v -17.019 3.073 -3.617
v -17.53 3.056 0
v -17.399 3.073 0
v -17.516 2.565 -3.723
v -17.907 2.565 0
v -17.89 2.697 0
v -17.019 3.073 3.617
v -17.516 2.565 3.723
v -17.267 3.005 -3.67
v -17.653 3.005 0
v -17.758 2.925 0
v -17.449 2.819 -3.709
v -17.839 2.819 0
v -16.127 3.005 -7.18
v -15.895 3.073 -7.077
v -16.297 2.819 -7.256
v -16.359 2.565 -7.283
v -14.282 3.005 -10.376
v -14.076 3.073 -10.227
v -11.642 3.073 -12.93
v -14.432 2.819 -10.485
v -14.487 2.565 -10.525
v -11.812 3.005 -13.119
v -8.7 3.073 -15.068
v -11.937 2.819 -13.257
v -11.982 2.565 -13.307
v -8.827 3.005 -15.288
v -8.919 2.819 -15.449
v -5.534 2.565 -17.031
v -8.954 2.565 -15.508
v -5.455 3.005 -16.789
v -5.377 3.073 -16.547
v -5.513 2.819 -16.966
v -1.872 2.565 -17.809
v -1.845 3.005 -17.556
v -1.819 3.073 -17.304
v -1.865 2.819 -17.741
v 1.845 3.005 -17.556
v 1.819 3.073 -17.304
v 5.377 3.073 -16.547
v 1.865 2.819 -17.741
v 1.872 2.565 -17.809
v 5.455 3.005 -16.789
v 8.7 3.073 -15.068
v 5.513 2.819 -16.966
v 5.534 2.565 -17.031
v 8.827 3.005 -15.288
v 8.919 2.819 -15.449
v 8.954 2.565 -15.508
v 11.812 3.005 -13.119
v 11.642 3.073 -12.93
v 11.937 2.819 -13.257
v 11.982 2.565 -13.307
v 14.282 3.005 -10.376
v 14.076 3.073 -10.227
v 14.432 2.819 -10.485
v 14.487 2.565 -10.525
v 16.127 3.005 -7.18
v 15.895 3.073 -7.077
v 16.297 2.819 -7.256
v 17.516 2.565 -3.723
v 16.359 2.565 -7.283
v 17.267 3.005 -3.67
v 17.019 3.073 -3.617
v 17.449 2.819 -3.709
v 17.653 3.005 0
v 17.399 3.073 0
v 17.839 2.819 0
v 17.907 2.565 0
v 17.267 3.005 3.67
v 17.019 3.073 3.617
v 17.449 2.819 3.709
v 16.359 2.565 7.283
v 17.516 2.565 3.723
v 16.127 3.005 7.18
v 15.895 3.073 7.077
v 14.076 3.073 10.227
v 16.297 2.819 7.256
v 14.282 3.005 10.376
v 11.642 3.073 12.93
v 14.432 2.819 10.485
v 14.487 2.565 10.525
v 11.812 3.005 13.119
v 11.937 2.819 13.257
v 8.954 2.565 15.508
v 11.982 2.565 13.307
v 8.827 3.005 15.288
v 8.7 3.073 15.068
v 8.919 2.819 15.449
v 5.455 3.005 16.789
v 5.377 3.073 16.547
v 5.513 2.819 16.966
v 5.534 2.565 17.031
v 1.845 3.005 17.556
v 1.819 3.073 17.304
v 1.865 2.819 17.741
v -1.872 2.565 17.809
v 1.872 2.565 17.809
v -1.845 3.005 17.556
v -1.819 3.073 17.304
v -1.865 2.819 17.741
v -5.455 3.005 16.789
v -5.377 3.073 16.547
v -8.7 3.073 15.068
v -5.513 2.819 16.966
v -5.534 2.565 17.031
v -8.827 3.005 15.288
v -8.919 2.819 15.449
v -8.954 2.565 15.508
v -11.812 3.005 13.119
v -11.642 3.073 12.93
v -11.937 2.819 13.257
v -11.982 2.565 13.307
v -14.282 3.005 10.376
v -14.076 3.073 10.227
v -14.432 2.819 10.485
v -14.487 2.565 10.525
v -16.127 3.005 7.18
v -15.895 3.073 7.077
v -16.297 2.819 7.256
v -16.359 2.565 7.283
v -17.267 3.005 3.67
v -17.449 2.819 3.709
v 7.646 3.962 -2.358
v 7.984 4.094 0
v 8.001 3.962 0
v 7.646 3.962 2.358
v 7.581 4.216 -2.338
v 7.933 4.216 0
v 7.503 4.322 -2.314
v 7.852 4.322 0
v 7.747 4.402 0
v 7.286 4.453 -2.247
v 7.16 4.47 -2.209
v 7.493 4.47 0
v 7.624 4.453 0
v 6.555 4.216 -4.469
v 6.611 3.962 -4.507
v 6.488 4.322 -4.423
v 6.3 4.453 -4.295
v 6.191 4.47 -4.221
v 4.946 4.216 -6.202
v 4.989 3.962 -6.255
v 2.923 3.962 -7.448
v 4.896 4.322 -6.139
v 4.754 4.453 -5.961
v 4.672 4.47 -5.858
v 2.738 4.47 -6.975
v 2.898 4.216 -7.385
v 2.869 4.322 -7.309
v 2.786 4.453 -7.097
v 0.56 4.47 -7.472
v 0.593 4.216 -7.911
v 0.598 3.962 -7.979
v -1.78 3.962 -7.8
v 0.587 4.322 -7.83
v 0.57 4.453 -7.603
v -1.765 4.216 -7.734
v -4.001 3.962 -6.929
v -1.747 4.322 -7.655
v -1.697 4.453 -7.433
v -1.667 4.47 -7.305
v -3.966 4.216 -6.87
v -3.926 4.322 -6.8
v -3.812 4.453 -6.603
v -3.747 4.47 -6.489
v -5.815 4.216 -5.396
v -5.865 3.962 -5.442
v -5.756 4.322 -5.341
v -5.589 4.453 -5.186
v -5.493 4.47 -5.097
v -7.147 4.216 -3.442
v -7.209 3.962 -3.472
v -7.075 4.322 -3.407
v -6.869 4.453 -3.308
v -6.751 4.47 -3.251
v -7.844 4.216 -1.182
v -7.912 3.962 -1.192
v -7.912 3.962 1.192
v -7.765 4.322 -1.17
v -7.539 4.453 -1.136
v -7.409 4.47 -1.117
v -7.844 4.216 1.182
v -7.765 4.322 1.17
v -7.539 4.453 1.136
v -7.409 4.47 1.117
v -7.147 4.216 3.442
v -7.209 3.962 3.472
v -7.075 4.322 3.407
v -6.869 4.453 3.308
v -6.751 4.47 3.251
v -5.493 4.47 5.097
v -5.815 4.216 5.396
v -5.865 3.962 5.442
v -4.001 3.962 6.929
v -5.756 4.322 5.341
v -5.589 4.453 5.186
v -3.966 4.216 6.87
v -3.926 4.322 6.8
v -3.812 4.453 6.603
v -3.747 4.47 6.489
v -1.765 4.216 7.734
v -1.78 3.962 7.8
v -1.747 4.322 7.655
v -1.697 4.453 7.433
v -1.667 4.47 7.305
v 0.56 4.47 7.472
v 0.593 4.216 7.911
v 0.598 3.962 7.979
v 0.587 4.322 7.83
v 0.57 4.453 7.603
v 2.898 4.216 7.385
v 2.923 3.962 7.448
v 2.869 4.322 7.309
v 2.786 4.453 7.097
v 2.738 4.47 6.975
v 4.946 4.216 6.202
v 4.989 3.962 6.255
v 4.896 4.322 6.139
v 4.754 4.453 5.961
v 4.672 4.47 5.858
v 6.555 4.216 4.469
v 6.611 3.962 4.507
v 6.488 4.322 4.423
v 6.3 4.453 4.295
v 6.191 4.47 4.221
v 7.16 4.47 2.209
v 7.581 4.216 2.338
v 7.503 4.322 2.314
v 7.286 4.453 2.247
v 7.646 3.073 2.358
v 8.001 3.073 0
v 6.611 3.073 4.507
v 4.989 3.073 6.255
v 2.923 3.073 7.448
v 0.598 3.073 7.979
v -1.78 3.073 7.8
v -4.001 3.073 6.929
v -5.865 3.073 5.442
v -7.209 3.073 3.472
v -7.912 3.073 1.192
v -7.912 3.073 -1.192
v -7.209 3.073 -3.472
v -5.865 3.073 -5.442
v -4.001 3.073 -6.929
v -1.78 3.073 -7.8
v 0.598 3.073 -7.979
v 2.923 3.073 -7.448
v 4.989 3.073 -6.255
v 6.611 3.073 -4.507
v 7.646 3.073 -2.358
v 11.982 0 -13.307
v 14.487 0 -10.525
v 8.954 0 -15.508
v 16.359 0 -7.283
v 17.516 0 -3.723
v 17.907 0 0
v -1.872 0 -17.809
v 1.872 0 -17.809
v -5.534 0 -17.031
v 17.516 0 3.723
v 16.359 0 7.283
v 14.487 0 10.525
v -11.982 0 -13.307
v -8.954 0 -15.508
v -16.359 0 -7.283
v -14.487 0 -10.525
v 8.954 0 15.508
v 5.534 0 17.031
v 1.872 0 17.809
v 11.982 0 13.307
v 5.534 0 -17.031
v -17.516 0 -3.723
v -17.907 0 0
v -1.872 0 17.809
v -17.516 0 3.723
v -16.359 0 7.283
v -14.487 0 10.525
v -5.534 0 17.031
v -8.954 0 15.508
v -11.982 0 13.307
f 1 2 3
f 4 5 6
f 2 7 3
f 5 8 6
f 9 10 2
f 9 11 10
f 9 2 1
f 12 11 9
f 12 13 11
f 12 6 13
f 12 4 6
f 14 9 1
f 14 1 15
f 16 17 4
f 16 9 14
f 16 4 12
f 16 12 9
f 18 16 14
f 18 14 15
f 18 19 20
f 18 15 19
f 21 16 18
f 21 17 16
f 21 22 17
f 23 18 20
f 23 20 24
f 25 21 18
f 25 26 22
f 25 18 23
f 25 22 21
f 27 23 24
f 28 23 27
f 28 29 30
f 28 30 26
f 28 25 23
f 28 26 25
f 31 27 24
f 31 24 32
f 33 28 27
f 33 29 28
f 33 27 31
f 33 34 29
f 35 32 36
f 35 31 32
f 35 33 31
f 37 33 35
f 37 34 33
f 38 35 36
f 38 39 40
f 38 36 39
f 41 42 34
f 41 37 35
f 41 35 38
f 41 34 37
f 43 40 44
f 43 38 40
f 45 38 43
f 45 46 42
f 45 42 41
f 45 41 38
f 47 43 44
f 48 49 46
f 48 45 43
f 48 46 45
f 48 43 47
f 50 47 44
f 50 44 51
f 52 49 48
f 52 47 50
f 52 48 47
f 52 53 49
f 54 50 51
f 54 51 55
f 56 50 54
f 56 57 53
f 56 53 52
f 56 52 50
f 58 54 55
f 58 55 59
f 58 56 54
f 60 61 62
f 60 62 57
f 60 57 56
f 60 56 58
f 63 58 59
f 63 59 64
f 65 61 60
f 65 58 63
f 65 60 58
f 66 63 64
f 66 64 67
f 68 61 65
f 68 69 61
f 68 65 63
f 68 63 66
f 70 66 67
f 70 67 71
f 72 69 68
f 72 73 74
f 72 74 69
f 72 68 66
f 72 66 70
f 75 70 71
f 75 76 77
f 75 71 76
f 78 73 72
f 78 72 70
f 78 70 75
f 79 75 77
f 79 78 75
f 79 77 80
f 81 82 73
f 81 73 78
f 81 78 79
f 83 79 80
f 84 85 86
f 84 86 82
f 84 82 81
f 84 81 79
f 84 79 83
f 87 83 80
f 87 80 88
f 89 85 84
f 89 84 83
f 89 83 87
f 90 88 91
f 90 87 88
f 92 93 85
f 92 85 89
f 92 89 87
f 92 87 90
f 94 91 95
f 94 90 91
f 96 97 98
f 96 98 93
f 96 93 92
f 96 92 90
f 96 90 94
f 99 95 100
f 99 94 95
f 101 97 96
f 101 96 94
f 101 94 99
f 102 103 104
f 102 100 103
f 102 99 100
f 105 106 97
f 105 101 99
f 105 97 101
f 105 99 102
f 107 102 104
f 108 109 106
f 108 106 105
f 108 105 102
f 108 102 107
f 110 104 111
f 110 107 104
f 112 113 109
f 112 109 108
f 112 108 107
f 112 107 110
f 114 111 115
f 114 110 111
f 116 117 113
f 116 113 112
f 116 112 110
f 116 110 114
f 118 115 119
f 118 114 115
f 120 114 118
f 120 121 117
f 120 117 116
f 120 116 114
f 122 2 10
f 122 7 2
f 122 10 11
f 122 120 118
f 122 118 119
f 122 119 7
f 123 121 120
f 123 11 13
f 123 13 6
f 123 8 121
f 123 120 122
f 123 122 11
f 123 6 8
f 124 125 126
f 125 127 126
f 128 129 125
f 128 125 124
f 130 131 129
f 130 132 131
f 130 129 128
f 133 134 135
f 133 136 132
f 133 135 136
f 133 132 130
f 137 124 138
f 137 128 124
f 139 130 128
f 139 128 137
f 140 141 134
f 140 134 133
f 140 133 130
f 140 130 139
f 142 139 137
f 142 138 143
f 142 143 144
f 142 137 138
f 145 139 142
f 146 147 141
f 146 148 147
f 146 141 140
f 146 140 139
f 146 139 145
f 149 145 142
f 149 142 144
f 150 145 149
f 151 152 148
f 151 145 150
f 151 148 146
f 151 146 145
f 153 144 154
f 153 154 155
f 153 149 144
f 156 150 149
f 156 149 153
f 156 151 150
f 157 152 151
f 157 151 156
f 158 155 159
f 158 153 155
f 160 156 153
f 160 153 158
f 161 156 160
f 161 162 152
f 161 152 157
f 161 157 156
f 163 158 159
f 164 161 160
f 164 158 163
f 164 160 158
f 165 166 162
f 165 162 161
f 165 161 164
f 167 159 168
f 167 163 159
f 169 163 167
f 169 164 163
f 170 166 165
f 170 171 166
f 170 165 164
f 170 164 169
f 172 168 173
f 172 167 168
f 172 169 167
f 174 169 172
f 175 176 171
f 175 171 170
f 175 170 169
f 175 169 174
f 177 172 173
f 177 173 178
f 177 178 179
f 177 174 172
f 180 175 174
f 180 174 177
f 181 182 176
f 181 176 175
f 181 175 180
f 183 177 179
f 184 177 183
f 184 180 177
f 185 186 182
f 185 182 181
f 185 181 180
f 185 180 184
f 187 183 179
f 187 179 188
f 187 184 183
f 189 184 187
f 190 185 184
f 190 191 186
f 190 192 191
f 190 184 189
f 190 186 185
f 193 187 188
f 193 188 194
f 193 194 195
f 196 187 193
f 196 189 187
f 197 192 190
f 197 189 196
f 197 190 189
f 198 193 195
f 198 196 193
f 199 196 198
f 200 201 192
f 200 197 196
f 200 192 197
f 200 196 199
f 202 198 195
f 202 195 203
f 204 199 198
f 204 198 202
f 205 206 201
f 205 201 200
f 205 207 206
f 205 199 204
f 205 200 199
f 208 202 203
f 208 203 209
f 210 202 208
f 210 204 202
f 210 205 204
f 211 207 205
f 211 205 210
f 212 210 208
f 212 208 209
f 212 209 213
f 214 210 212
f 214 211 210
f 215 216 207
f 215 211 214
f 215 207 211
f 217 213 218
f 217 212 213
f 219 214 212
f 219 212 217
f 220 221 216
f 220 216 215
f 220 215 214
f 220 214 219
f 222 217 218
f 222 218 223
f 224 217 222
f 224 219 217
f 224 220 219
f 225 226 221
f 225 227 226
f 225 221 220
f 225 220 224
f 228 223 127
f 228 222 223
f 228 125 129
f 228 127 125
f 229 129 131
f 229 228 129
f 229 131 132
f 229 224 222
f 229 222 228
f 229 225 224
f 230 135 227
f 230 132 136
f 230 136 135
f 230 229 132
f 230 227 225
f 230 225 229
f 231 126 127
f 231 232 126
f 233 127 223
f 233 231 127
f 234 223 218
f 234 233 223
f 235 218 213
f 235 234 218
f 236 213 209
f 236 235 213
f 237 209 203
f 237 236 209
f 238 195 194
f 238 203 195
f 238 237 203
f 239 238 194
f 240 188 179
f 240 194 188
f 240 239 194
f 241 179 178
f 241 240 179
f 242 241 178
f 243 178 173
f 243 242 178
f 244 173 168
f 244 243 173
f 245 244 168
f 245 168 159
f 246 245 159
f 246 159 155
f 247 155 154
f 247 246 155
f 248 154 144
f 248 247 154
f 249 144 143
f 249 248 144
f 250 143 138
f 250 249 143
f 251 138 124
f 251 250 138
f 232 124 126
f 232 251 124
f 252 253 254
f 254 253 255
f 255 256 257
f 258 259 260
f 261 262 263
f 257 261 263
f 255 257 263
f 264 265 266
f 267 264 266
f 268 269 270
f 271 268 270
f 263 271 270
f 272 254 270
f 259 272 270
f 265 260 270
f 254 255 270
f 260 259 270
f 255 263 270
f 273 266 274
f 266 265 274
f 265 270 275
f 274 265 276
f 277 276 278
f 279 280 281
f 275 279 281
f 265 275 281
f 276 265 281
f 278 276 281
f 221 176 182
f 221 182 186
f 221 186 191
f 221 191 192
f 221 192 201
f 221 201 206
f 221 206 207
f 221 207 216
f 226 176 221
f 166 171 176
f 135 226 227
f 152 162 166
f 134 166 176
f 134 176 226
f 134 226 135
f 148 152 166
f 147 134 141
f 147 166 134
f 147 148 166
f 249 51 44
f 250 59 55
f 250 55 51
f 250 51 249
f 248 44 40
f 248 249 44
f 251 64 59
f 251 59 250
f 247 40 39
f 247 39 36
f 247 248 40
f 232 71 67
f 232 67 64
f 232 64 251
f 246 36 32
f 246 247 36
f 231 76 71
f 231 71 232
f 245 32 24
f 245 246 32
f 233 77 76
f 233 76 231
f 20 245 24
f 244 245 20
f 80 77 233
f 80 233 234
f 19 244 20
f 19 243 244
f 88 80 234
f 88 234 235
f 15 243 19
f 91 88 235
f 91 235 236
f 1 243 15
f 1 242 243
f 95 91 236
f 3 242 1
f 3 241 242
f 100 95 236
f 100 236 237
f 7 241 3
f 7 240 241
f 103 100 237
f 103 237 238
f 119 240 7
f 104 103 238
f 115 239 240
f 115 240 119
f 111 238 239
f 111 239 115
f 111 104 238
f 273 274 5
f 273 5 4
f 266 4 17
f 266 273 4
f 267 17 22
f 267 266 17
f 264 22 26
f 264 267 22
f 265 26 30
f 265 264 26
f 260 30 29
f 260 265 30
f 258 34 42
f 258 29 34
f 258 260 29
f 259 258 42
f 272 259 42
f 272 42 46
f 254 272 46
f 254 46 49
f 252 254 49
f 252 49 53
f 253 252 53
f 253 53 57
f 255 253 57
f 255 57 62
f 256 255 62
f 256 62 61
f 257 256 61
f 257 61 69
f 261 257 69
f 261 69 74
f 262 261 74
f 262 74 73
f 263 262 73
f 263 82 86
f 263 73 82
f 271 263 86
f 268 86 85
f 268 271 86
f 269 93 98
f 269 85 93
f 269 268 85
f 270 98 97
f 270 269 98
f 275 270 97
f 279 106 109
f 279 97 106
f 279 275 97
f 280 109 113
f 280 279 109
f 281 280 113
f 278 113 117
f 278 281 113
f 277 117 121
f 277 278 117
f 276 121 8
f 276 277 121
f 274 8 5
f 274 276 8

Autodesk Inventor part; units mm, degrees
ref_plane "YZ Plane" through (0, 0, 0) normal (1, 0, 0) x (0, 1, 0)
ref_plane "XZ Plane" through (0, 0, 0) normal (0, 1, 0) x (-1, 0, 0)
ref_plane "XY Plane" through (0, 0, 0) normal (0, 0, 1) x (1, 0, 0)
sketch "Sketch1" plane through (0, 0, 0) normal (0, 1, 0) x (-1, 0, 0)
  circle A0 centre (0, 0) radius 17.907
  dimension "d0" = 35.814
extrude "Extrusion1" add sketch "Sketch1" along normal blind 3.0734
sketch "Sketch2" plane through (0, 3.0734, 0) normal (0, 1, 0) x (1, 0, 0)
  circle A0 centre (0, 0) radius 8.001
  dimension "d3" = 16.002
extrude "Extrusion2" add sketch "Sketch2" along normal blind 1.397
fillet "Fillet1" radius 0.508 1 edges at (-8.001, 4.4704, 0)
fillet "Fillet2" radius 0.508 1 edges at (17.907, 3.0734, 0)
properties part number "speaker"
